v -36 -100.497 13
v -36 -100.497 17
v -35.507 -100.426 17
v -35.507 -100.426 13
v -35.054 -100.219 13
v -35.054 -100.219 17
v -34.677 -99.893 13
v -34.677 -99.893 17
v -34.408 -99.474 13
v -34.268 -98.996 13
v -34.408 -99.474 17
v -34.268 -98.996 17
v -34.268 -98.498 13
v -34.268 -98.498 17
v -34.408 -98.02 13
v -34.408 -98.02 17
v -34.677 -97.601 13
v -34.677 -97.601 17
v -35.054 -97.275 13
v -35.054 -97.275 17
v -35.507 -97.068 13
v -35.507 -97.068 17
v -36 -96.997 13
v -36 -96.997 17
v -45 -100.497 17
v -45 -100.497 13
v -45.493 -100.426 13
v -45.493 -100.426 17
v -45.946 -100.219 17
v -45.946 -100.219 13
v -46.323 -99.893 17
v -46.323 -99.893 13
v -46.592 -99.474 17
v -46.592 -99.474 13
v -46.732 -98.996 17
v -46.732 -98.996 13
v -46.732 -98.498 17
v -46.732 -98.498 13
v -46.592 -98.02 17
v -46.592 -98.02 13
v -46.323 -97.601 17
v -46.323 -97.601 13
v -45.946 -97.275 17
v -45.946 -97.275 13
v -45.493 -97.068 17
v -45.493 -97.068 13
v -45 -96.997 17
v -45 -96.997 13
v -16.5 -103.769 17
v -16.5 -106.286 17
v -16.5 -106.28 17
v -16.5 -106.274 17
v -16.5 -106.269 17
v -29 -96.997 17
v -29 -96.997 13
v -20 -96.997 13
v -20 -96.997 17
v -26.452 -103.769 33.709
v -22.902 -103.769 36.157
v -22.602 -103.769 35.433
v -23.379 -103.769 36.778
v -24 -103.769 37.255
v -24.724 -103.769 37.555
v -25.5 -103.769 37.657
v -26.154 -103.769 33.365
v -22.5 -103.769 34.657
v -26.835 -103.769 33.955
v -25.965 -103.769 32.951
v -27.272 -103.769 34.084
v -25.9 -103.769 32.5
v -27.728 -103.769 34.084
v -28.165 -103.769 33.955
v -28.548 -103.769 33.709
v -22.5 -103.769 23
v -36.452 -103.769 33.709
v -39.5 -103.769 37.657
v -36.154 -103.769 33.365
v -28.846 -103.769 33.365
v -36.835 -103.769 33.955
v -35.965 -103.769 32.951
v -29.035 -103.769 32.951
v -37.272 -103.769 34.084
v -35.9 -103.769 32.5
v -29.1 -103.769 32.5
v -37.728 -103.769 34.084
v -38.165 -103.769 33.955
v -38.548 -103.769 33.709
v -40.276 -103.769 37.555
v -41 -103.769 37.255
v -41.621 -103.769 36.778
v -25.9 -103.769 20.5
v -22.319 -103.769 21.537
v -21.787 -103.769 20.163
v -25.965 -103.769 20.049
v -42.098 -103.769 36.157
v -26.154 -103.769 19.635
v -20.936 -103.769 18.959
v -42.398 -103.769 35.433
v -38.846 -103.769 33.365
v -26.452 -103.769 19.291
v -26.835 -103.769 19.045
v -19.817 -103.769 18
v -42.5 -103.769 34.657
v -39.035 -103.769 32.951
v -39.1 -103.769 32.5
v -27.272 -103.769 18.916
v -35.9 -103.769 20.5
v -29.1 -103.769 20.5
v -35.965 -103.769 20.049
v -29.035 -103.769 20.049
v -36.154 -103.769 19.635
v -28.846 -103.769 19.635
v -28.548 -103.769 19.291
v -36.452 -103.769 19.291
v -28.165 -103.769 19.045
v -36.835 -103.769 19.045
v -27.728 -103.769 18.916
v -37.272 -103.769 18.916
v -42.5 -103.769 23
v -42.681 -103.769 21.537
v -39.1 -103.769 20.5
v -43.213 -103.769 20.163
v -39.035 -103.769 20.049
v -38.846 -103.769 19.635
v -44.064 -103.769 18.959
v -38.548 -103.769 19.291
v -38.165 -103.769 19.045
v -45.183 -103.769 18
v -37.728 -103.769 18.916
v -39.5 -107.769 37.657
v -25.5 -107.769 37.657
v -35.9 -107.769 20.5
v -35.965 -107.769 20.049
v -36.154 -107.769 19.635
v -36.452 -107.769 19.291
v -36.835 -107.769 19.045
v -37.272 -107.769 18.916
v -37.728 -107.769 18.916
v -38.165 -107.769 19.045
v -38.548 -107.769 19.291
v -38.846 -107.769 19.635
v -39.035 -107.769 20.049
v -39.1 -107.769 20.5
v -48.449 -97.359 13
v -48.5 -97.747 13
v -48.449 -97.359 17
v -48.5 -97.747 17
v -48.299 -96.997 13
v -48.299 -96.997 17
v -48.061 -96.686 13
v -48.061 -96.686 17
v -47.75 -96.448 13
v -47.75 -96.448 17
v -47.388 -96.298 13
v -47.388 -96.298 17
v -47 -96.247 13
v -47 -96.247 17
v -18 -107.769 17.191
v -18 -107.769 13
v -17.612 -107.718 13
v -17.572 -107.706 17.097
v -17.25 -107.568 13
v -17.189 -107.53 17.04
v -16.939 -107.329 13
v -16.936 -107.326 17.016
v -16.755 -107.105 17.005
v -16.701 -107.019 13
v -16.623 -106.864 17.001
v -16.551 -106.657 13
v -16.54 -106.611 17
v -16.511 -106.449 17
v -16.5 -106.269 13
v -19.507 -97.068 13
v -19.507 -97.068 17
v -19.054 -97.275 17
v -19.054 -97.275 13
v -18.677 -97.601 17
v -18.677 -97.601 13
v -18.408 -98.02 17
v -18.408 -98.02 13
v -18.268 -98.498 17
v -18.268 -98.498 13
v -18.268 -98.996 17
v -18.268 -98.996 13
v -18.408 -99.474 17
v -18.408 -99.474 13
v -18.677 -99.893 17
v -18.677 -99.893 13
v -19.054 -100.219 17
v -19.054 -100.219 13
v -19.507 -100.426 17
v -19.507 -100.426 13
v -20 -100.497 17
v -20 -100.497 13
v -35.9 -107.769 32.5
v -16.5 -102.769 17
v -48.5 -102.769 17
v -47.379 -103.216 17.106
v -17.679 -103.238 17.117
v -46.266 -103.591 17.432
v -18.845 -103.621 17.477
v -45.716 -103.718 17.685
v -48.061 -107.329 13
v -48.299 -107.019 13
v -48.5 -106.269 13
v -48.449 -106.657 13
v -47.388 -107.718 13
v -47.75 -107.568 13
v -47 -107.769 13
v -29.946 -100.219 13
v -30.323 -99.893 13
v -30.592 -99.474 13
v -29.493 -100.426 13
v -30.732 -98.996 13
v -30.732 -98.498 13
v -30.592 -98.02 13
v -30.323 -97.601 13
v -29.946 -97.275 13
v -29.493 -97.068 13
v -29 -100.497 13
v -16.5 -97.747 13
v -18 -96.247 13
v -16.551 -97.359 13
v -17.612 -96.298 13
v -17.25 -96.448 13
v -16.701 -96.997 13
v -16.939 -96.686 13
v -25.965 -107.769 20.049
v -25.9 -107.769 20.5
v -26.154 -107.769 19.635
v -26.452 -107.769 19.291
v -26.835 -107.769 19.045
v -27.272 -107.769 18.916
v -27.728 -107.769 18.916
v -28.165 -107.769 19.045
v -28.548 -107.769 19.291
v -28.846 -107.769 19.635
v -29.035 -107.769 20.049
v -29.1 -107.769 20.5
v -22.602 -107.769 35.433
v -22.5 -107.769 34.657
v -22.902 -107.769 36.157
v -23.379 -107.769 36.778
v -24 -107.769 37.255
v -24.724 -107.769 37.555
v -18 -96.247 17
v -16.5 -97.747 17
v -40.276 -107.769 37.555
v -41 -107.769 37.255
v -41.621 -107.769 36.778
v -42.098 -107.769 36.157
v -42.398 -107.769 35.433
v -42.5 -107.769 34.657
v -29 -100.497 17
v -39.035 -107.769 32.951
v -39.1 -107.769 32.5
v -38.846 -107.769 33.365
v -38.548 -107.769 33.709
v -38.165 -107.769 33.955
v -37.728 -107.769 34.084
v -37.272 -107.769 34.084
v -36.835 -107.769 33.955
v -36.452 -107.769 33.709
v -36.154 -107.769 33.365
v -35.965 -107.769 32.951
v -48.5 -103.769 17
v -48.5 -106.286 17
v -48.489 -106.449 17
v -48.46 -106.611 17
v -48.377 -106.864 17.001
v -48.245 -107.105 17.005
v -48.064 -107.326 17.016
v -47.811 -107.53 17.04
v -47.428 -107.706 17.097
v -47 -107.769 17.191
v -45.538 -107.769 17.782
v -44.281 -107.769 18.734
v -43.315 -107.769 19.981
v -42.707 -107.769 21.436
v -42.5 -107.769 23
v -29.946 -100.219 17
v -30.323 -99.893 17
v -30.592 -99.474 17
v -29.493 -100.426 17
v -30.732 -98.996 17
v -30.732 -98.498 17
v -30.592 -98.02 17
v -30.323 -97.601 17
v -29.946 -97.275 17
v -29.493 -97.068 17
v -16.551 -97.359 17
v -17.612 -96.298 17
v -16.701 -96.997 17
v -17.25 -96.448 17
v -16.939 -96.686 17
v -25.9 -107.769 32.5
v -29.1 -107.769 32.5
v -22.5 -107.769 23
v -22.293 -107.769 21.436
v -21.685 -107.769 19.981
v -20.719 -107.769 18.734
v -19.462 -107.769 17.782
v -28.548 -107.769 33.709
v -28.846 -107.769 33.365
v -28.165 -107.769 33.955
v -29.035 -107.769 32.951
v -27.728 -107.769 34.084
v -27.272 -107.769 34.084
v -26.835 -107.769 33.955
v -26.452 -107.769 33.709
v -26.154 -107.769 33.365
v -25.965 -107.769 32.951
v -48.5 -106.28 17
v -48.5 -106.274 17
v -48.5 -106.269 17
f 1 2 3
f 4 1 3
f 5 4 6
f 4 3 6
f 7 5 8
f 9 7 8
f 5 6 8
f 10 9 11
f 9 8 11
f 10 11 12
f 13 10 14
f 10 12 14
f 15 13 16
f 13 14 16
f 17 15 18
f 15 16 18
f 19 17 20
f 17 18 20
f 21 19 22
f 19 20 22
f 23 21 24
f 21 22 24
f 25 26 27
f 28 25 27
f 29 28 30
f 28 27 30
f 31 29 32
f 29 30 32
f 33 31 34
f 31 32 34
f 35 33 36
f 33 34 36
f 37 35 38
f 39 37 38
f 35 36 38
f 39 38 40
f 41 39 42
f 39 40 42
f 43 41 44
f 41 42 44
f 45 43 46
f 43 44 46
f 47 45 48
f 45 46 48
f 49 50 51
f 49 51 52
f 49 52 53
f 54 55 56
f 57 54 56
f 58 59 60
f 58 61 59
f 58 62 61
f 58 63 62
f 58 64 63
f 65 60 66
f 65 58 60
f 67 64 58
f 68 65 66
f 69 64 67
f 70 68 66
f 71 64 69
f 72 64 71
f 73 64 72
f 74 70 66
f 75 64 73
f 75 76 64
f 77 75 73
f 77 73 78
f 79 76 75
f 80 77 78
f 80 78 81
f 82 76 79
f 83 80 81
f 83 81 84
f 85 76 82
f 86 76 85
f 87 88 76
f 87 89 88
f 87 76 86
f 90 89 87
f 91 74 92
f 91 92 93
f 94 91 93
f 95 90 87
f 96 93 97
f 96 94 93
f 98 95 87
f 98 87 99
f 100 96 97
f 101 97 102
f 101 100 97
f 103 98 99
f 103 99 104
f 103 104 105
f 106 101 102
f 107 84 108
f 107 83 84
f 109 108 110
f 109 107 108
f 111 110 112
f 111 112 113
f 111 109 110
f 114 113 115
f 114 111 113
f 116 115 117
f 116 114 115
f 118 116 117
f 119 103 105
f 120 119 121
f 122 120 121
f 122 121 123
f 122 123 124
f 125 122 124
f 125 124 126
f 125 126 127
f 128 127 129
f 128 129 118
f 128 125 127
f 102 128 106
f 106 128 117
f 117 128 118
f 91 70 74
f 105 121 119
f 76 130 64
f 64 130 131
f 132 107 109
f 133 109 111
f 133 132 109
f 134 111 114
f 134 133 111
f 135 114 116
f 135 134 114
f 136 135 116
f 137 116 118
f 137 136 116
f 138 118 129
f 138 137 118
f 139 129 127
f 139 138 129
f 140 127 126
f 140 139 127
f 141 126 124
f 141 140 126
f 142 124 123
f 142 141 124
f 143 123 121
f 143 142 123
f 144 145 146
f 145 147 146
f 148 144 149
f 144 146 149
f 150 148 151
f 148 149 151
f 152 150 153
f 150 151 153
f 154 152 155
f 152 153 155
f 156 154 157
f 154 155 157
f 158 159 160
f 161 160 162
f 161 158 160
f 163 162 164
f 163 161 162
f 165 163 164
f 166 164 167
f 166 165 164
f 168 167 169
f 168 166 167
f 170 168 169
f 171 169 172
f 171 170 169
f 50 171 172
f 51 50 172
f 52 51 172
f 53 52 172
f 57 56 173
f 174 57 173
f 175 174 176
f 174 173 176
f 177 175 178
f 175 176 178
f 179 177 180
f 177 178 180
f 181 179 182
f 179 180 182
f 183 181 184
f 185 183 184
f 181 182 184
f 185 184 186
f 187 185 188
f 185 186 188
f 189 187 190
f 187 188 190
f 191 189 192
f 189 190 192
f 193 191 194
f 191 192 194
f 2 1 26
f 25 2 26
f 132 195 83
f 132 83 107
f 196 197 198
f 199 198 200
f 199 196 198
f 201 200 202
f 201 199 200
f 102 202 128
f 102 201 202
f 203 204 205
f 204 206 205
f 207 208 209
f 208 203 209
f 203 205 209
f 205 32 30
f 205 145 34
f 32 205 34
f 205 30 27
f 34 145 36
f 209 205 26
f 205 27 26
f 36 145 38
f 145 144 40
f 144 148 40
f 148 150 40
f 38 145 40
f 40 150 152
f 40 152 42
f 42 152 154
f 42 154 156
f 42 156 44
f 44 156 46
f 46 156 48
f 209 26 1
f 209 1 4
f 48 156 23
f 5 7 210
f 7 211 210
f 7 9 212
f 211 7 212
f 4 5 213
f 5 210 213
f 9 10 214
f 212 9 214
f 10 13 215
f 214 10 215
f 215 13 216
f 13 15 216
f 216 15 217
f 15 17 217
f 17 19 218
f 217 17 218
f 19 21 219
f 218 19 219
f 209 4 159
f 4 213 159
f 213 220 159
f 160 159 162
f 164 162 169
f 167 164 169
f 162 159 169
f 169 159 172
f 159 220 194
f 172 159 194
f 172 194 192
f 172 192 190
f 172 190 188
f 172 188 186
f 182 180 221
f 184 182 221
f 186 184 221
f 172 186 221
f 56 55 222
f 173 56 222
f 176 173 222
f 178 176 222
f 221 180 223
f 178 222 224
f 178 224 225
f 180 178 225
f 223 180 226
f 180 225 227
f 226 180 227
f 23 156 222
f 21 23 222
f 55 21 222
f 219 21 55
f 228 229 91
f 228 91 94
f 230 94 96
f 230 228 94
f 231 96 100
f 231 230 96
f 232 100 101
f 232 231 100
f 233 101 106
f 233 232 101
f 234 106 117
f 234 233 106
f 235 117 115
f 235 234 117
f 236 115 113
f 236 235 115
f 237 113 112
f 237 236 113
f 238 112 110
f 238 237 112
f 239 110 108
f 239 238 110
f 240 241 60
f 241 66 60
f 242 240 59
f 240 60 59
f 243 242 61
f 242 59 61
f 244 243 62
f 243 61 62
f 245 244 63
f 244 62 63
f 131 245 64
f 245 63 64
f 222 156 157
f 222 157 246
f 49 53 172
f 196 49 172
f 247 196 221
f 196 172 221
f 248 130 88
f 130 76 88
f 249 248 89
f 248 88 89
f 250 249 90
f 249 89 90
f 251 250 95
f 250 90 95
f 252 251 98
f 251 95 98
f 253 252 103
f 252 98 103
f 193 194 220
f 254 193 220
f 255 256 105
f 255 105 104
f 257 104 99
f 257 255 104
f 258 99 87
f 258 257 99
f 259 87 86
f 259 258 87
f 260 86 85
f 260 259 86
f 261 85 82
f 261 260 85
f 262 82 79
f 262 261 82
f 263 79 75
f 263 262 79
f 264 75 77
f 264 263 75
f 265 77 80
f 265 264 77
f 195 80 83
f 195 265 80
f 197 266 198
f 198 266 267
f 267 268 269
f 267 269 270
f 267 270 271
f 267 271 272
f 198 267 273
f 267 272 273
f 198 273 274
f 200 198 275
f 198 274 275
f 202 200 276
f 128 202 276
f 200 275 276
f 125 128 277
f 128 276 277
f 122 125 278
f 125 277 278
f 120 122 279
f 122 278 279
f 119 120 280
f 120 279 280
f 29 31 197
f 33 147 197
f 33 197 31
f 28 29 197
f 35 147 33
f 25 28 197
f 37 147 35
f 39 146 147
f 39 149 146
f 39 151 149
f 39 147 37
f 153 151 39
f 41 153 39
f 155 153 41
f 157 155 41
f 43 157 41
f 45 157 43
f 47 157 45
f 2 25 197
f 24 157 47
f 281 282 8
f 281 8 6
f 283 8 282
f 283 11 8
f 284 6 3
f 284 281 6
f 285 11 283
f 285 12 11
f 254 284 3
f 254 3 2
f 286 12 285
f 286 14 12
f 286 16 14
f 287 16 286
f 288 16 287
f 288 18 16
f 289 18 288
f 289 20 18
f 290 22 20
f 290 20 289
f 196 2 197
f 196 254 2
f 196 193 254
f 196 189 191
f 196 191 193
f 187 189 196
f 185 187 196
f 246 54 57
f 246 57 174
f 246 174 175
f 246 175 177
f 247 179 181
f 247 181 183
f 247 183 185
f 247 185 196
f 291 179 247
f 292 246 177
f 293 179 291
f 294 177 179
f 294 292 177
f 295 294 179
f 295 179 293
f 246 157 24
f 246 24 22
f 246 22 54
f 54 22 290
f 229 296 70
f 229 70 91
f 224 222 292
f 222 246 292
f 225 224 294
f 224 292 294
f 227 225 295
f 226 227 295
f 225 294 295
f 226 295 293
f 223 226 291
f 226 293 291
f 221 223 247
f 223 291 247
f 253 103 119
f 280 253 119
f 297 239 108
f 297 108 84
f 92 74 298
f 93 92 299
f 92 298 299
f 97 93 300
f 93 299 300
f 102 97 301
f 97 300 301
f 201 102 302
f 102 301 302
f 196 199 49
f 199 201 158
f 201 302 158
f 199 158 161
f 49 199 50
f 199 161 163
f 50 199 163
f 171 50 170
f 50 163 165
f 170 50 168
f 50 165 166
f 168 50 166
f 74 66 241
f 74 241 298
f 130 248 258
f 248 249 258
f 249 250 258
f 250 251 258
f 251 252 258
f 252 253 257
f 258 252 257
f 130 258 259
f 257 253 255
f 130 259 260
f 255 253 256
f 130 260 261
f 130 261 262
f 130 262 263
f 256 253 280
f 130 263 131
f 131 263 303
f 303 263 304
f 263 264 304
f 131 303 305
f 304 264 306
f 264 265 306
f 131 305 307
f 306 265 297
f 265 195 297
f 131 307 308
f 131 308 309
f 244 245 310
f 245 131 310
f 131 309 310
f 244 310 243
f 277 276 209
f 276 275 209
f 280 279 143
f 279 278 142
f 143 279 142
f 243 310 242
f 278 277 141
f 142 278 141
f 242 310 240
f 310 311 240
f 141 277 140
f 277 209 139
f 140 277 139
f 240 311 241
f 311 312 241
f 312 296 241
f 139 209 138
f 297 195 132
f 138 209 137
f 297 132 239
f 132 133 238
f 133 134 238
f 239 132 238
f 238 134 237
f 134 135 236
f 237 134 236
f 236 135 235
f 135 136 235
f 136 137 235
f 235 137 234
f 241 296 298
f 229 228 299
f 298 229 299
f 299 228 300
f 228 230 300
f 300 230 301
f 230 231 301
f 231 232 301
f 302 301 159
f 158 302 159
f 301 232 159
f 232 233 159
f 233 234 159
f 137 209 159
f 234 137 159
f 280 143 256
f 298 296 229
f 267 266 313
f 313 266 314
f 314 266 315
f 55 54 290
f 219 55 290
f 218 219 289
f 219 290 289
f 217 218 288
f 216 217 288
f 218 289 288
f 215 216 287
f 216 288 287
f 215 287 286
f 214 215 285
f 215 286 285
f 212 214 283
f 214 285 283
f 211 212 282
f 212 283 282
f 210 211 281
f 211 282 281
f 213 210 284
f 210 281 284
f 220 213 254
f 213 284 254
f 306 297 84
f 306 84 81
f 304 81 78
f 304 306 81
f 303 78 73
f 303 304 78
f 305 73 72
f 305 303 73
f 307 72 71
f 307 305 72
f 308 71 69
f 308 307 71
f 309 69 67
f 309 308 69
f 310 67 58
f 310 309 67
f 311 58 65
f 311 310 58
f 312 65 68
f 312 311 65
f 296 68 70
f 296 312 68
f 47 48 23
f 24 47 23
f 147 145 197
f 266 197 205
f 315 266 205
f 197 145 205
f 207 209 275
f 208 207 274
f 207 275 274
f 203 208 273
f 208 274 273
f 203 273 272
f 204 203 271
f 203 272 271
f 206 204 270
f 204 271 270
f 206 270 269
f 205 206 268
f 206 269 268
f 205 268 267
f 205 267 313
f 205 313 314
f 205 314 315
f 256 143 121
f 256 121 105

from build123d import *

# Parameters (mm, degrees)
EXTRUDE_1_DEPTH           = 3
SKETCH_7_R                = 2.25
CUT_EXTRUDE_2_DEPTH       = 143.955430949
SKETCH_8_R                = 8
CUT_EXTRUDE_3_DEPTH       = 143.955430949
CUT_EXTRUDE_4_DEPTH       = 3
CUT_EXTRUDE_5_DEPTH       = 3
CUT_EXTRUDE_8_DEPTH       = 3
SKETCH_12_R               = 1.7
CUT_EXTRUDE_9_DEPTH       = 3
SKETCH_13_R               = 1.7
CUT_EXTRUDE_11_DEPTH      = 3
CUT_EXTRUDE_12_DEPTH      = 143.955430949
FILLET_1_R                = 2
FILLET_2_R                = 2
CUT_EXTRUDE_13_DEPTH      = 143.955430949
CUT_EXTRUDE_14_DEPTH      = 143.955430949
CUT_EXTRUDE_15_DEPTH      = 143.955430949
CUT_EXTRUDE_16_DEPTH      = 143.955430949
EXTRUDE_2_DEPTH           = 4
EXTRUDE_2_2_DEPTH         = 4
EXTRUDE_4_DEPTH           = 4
EXTRUDE_5_DEPTH           = 35
SKETCH_25_W               = 6
SKETCH_25_H               = 31
CUT_EXTRUDE_17_DEPTH      = 5
FILLET_3_R                = 6
FILLET_4_R                = 6
FILLET_5_R                = 1.5
FILLET_6_R                = 1.5
CUT_EXTRUDE_18_DEPTH      = 5
CUT_EXTRUDE_19_DEPTH      = 15
CUT_EXTRUDE_19_DEPTH_BACK = 95
SKETCH_27_W               = 31
SKETCH_27_H               = 1
FILLET_8_R                = 1
FILLET_9_R                = 1
FILLET_10_R               = 3
SKETCH_28_W               = 85
SKETCH_28_H               = 10.343066278
CUT_EXTRUDE_20_DEPTH      = 5
FILLET_12_R               = 3
FILLET_13_R               = 3
SKETCH_32_W               = 45.323158308
SKETCH_32_H               = 39.541616474
CUT_EXTRUDE_22_DEPTH      = 40


# Read off the part's stored shape, not the designer's step: 切除-拉伸21
# Some blends are built 0.0001 mm under size
with BuildPart() as part:
    # 草图1 → 凸台-拉伸1 (new body)
    # profile 1 of 14: a face of its own
    with BuildSketch(Plane.XY):
        with BuildLine():
            Line((60, 106.603296002), (35.889163634, 121.664519159))
            Line((35.889163634, 121.664519159), (-35.889163634, 121.664519159))
            Line((-35.889163634, 121.664519159), (-60, 106.603296002))
            Line((-60, 106.603296002), (-60, 94.801892265))
            Line((-60, 94.801892265), (-45, 94.801892265))
            ThreePointArc((-45, 94.801892265), (-43.762563133, 94.289329132), (-43.25, 93.051892265))
            Line((-43.25, 93.051892265), (-37.75, 93.051892265))
            ThreePointArc((-37.75, 93.051892265), (-37.237436867, 94.289329132), (-36, 94.801892265))
            Line((-36, 94.801892265), (-21, 94.801892265))
            ThreePointArc((-21, 94.801892265), (-19.762563133, 94.289329132), (-19.25, 93.051892265))
            Line((-19.25, 93.051892265), (19.25, 93.051892265))
            ThreePointArc((19.25, 93.051892265), (19.762563133, 94.289329132), (21, 94.801892265))
            Line((21, 94.801892265), (36, 94.801892265))
            ThreePointArc((36, 94.801892265), (37.237436867, 94.289329132), (37.75, 93.051892265))
            Line((37.75, 93.051892265), (43.25, 93.051892265))
            ThreePointArc((43.25, 93.051892265), (43.762563133, 94.289329132), (45, 94.801892265))
            Line((45, 94.801892265), (60, 94.801892265))
            Line((60, 94.801892265), (60, 106.603296002))
        make_face()
    # profile 2 of 14: a face of its own
    with BuildSketch(Plane.XY):
        with BuildLine():
            Line((66.901694095, 102.292041372), (60, 106.603296002))
            Line((60, 106.603296002), (60, 94.801892265))
            ThreePointArc((60, 94.801892265), (61.237436867, 94.289329132), (61.75, 93.051892265))
            Line((61.75, 93.051892265), (66.901694095, 93.051892265))
            Line((66.901694095, 93.051892265), (66.901694095, 102.292041372))
        make_face()
    # profile 3 of 14: a face of its own
    with BuildSketch(Plane.XY):
        with BuildLine():
            Line((-60, 94.801892265), (-60, 106.603296002))
            Line((-60, 106.603296002), (-66.901694095, 102.292041372))
            Line((-66.901694095, 102.292041372), (-66.901694095, 93.051892265))
            Line((-66.901694095, 93.051892265), (-61.75, 93.051892265))
            ThreePointArc((-61.75, 93.051892265), (-61.237436867, 94.289329132), (-60, 94.801892265))
        make_face()
    # profile 4 of 14: a face of its own
    with BuildSketch(Plane.XY):
        with BuildLine():
            Line((66.901694095, 63.051892265), (66.901694095, 93.051892265))
            Line((66.901694095, 93.051892265), (61.75, 93.051892265))
            ThreePointArc((61.75, 93.051892265), (61.237436867, 91.814455398), (60, 91.301892265))
            Line((60, 91.301892265), (60, 64.801892265))
            ThreePointArc((60, 64.801892265), (61.237436867, 64.289329132), (61.75, 63.051892265))
            Line((61.75, 63.051892265), (66.901694095, 63.051892265))
        make_face()
    # profile 5 of 14: a face of its own
    with BuildSketch(Plane.XY):
        with BuildLine():
            Line((-61.75, 93.051892265), (-66.901694095, 93.051892265))
            Line((-66.901694095, 93.051892265), (-66.901694095, 63.051892265))
            Line((-66.901694095, 63.051892265), (-61.75, 63.051892265))
            ThreePointArc((-61.75, 63.051892265), (-61.237436867, 64.289329132), (-60, 64.801892265))
            Line((-60, 64.801892265), (-60, 91.301892265))
            ThreePointArc((-60, 91.301892265), (-61.237436867, 91.814455398), (-61.75, 93.051892265))
        make_face()
    # profile 6 of 14: a face of its own
    with BuildSketch(Plane.XY):
        with BuildLine():
            Line((66.901694095, 52.870133869), (66.901694095, 63.051892265))
            Line((66.901694095, 63.051892265), (61.75, 63.051892265))
            ThreePointArc((61.75, 63.051892265), (61.237436867, 61.814455398), (60, 61.301892265))
            Line((60, 61.301892265), (60, 31.261343001))
            Line((60, 31.261343001), (75, 31.261343001))
            Line((75, 31.261343001), (75, 40.933889795))
            ThreePointArc((75, 40.933889795), (69.117351927, 45.658052319), (66.901694095, 52.870133869))
        make_face()
    # profile 7 of 14: a face of its own
    with BuildSketch(Plane.XY):
        with BuildLine():
            Line((60, 64.801892265), (60, 91.301892265))
            Line((60, 91.301892265), (45, 91.301892265))
            ThreePointArc((45, 91.301892265), (43.762563133, 91.814455398), (43.25, 93.051892265))
            Line((43.25, 93.051892265), (37.75, 93.051892265))
            ThreePointArc((37.75, 93.051892265), (37.237436867, 91.814455398), (36, 91.301892265))
            Line((36, 91.301892265), (21, 91.301892265))
            ThreePointArc((21, 91.301892265), (19.762563133, 91.814455398), (19.25, 93.051892265))
            Line((19.25, 93.051892265), (-19.25, 93.051892265))
            ThreePointArc((-19.25, 93.051892265), (-19.762563133, 91.814455398), (-21, 91.301892265))
            Line((-21, 91.301892265), (-36, 91.301892265))
            ThreePointArc((-36, 91.301892265), (-37.237436867, 91.814455398), (-37.75, 93.051892265))
            Line((-37.75, 93.051892265), (-43.25, 93.051892265))
            ThreePointArc((-43.25, 93.051892265), (-43.762563133, 91.814455398), (-45, 91.301892265))
            Line((-45, 91.301892265), (-60, 91.301892265))
            Line((-60, 91.301892265), (-60, 64.801892265))
            Line((-60, 64.801892265), (-45, 64.801892265))
            ThreePointArc((-45, 64.801892265), (-43.762563133, 64.289329132), (-43.25, 63.051892265))
            Line((-43.25, 63.051892265), (-37.75, 63.051892265))
            ThreePointArc((-37.75, 63.051892265), (-37.237436867, 64.289329132), (-36, 64.801892265))
            Line((-36, 64.801892265), (-21, 64.801892265))
            ThreePointArc((-21, 64.801892265), (-19.762563133, 64.289329132), (-19.25, 63.051892265))
            Line((-19.25, 63.051892265), (19.25, 63.051892265))
            ThreePointArc((19.25, 63.051892265), (19.762563133, 64.289329132), (21, 64.801892265))
            Line((21, 64.801892265), (36, 64.801892265))
            ThreePointArc((36, 64.801892265), (37.237436867, 64.289329132), (37.75, 63.051892265))
            Line((37.75, 63.051892265), (43.25, 63.051892265))
            ThreePointArc((43.25, 63.051892265), (43.762563133, 64.289329132), (45, 64.801892265))
            Line((45, 64.801892265), (60, 64.801892265))
        make_face()
    # profile 8 of 14: a face of its own
    with BuildSketch(Plane.XY):
        with BuildLine():
            Line((-61.75, 63.051892265), (-66.901694095, 63.051892265))
            Line((-66.901694095, 63.051892265), (-66.901694095, 52.870133869))
            ThreePointArc((-66.901694095, 52.870133869), (-69.117351927, 45.658052319), (-75, 40.933889795))
            Line((-75, 40.933889795), (-75, 31.261343001))
            Line((-75, 31.261343001), (-60, 31.261343001))
            Line((-60, 31.261343001), (-60, 61.301892265))
            ThreePointArc((-60, 61.301892265), (-61.237436867, 61.814455398), (-61.75, 63.051892265))
        make_face()
    # profile 9 of 14: a face of its own
    with BuildSketch(Plane.XY):
        with BuildLine():
            Line((60, 31.261343001), (60, 61.301892265))
            Line((60, 61.301892265), (45, 61.301892265))
            ThreePointArc((45, 61.301892265), (43.762563133, 61.814455398), (43.25, 63.051892265))
            Line((43.25, 63.051892265), (37.75, 63.051892265))
            ThreePointArc((37.75, 63.051892265), (37.237436867, 61.814455398), (36, 61.301892265))
            Line((36, 61.301892265), (21, 61.301892265))
            ThreePointArc((21, 61.301892265), (19.762563133, 61.814455398), (19.25, 63.051892265))
            Line((19.25, 63.051892265), (-19.25, 63.051892265))
            ThreePointArc((-19.25, 63.051892265), (-19.762563133, 61.814455398), (-21, 61.301892265))
            Line((-21, 61.301892265), (-36, 61.301892265))
            ThreePointArc((-36, 61.301892265), (-37.237436867, 61.814455398), (-37.75, 63.051892265))
            Line((-37.75, 63.051892265), (-43.25, 63.051892265))
            ThreePointArc((-43.25, 63.051892265), (-43.762563133, 61.814455398), (-45, 61.301892265))
            Line((-45, 61.301892265), (-60, 61.301892265))
            Line((-60, 61.301892265), (-60, 31.261343001))
            Line((-60, 31.261343001), (60, 31.261343001))
        make_face()
    # profile 10 of 14: a face of its own
    with BuildSketch(Plane.XY):
        with BuildLine():
            Line((60, -58.312864289), (60, 23.940028391))
            Line((60, 23.940028391), (-60, 23.940028391))
            Line((-60, 23.940028391), (-60, -58.312864289))
            Line((-60, -58.312864289), (-45, -58.312864289))
            ThreePointArc((-45, -58.312864289), (-43.25, -60.062864289), (-45, -61.812864289))
            Line((-45, -61.812864289), (-60, -61.812864289))
            Line((-60, -61.812864289), (-60, -88.312864289))
            Line((-60, -88.312864289), (-45, -88.312864289))
            ThreePointArc((-45, -88.312864289), (-43.25, -90.062864289), (-45, -91.812864289))
            Line((-45, -91.812864289), (-60, -91.812864289))
            Line((-60, -91.812864289), (-60, -111.849967256))
            Line((-60, -111.849967256), (-38.845469114, -105.590576733))
            ThreePointArc((-38.845469114, -105.590576733), (-36.037784492, -104.975210108), (-33.17088573, -104.768665882))
            Line((-33.17088573, -104.768665882), (33.17088573, -104.768665882))
            ThreePointArc((33.17088573, -104.768665882), (36.037784492, -104.975210108), (38.845469114, -105.590576733))
            Line((38.845469114, -105.590576733), (60, -111.849967256))
            Line((60, -111.849967256), (60, -91.812864289))
            Line((60, -91.812864289), (45, -91.812864289))
            ThreePointArc((45, -91.812864289), (43.762563133, -91.300301156), (43.25, -90.062864289))
            ThreePointArc((43.25, -90.062864289), (43.762563133, -88.825427422), (45, -88.312864289))
            Line((45, -88.312864289), (60, -88.312864289))
            Line((60, -88.312864289), (60, -61.812864289))
            Line((60, -61.812864289), (45, -61.812864289))
            ThreePointArc((45, -61.812864289), (43.762563133, -61.300301156), (43.25, -60.062864289))
            ThreePointArc((43.25, -60.062864289), (43.762563133, -58.825427422), (45, -58.312864289))
            Line((45, -58.312864289), (60, -58.312864289))
        make_face()
        with BuildLine():
            ThreePointArc((-21, -88.312864289), (-19.762563133, -88.825427422), (-19.25, -90.062864289))
            ThreePointArc((-19.25, -90.062864289), (-19.762563133, -91.300301156), (-21, -91.812864289))
            Line((-21, -91.812864289), (-36, -91.812864289))
            ThreePointArc((-36, -91.812864289), (-37.75, -90.062864289), (-36, -88.312864289))
            Line((-36, -88.312864289), (-21, -88.312864289))
        make_face(mode=Mode.SUBTRACT)
        with BuildLine():
            ThreePointArc((-21, -58.312864289), (-19.762563133, -58.825427422), (-19.25, -60.062864289))
            ThreePointArc((-19.25, -60.062864289), (-19.762563133, -61.300301156), (-21, -61.812864289))
            Line((-21, -61.812864289), (-36, -61.812864289))
            ThreePointArc((-36, -61.812864289), (-37.75, -60.062864289), (-36, -58.312864289))
            Line((-36, -58.312864289), (-21, -58.312864289))
        make_face(mode=Mode.SUBTRACT)
        with BuildLine():
            ThreePointArc((36, -88.312864289), (37.237436867, -88.825427422), (37.75, -90.062864289))
            ThreePointArc((37.75, -90.062864289), (37.237436867, -91.300301156), (36, -91.812864289))
            Line((36, -91.812864289), (21, -91.812864289))
            ThreePointArc((21, -91.812864289), (19.762563133, -91.300301156), (19.25, -90.062864289))
            ThreePointArc((19.25, -90.062864289), (19.762563133, -88.825427422), (21, -88.312864289))
            Line((21, -88.312864289), (36, -88.312864289))
        make_face(mode=Mode.SUBTRACT)
        with BuildLine():
            ThreePointArc((36, -58.312864289), (37.237436867, -58.825427422), (37.75, -60.062864289))
            ThreePointArc((37.75, -60.062864289), (37.237436867, -61.300301156), (36, -61.812864289))
            Line((36, -61.812864289), (21, -61.812864289))
            ThreePointArc((21, -61.812864289), (19.762563133, -61.300301156), (19.25, -60.062864289))
            ThreePointArc((19.25, -60.062864289), (19.762563133, -58.825427422), (21, -58.312864289))
            Line((21, -58.312864289), (36, -58.312864289))
        make_face(mode=Mode.SUBTRACT)
    # profile 11 of 14: a face of its own
    with BuildSketch(Plane.XY):
        with BuildLine():
            Line((75, 23.940028391), (60, 23.940028391))
            Line((60, 23.940028391), (60, -58.312864289))
            ThreePointArc((60, -58.312864289), (61.237436867, -58.825427422), (61.75, -60.062864289))
            Line((61.75, -60.062864289), (67.402721334, -60.062864289))
            add(Edge.make_bspline(
                [(75, 10.562559835), (72.695878257, 1.907314233), (70.339582535, -13.372796253), (67.818206704, -36.939032951), (67.208860388, -51.77269444), (67.402721334, -60.062864289)],
                knots=[0, 0, 0, 0, 0.235246678, 0.40629419, 0.624108181, 0.624108181, 0.624108181, 0.624108181], degree=3))
            Line((75, 10.562559835), (75, 23.940028391))
        make_face()
    # profile 12 of 14: a face of its own
    with BuildSketch(Plane.XY):
        with BuildLine():
            Line((-60, -58.312864289), (-60, 23.940028391))
            Line((-60, 23.940028391), (-75, 23.940028391))
            Line((-75, 23.940028391), (-75, 10.562559835))
            add(Edge.make_bspline(
                [(-75, 10.562559835), (-72.695878257, 1.907314233), (-70.339582535, -13.372796253), (-67.818206704, -36.939032951), (-67.208860388, -51.77269444), (-67.402721334, -60.062864289)],
                knots=[0, 0, 0, 0, 0.235246678, 0.40629419, 0.624108181, 0.624108181, 0.624108181, 0.624108181], degree=3))
            add(Edge.make_bspline(
                [(-67.402721334, -60.062864289), (-67.560325872, -66.802583754), (-68.323504015, -76.843670093), (-70.154131955, -86.778530076), (-70.533712858, -90.062864289)],
                knots=[0.624108181, 0.624108181, 0.624108181, 0.624108181, 0.801186001, 0.888408652, 0.888408652, 0.888408652, 0.888408652], degree=3))
            add(Edge.make_bspline(
                [(-70.533712858, -90.062864289), (-71.019342956, -94.264792095), (-71.137422935, -98.476048206), (-70.1742624, -102.732794059)],
                knots=[0.888408652, 0.888408652, 0.888408652, 0.888408652, 1, 1, 1, 1], degree=3))
            Line((-70.1742624, -102.732794059), (-66.460817635, -113.761651372))
            Line((-66.460817635, -113.761651372), (-60, -111.849967256))
            Line((-60, -111.849967256), (-60, -91.812864289))
            ThreePointArc((-60, -91.812864289), (-61.75, -90.062864289), (-60, -88.312864289))
            Line((-60, -88.312864289), (-60, -61.812864289))
            ThreePointArc((-60, -61.812864289), (-61.75, -60.062864289), (-60, -58.312864289))
        make_face()
    # profile 13 of 14: a face of its own
    with BuildSketch(Plane.XY):
        with BuildLine():
            Line((67.402721334, -60.062864289), (61.75, -60.062864289))
            ThreePointArc((61.75, -60.062864289), (61.237436867, -61.300301156), (60, -61.812864289))
            Line((60, -61.812864289), (60, -88.312864289))
            ThreePointArc((60, -88.312864289), (61.237436867, -88.825427422), (61.75, -90.062864289))
            Line((61.75, -90.062864289), (70.533712858, -90.062864289))
            add(Edge.make_bspline(
                [(67.402721334, -60.062864289), (67.560325872, -66.802583754), (68.323504015, -76.843670093), (70.154131955, -86.778530076), (70.533712858, -90.062864289)],
                knots=[0.624108181, 0.624108181, 0.624108181, 0.624108181, 0.801186001, 0.888408652, 0.888408652, 0.888408652, 0.888408652], degree=3))
        make_face()
    # profile 14 of 14: a face of its own
    with BuildSketch(Plane.XY):
        with BuildLine():
            add(Edge.make_bspline(
                [(70.533712858, -90.062864289), (71.019342956, -94.264792095), (71.137422935, -98.476048206), (70.1742624, -102.732794059)],
                knots=[0.888408652, 0.888408652, 0.888408652, 0.888408652, 1, 1, 1, 1], degree=3))
            Line((70.533712858, -90.062864289), (61.75, -90.062864289))
            ThreePointArc((61.75, -90.062864289), (61.237436867, -91.300301156), (60, -91.812864289))
            Line((60, -91.812864289), (60, -111.849967256))
            Line((60, -111.849967256), (66.460817635, -113.761651372))
            Line((66.460817635, -113.761651372), (70.1742624, -102.732794059))
        make_face()
    extrude(amount=EXTRUDE_1_DEPTH)

    # 草图7 → 切除-拉伸2 (cut, through all)
    with BuildSketch(Plane(origin=(0, 0, 0), x_dir=(-1, 0, 0), z_dir=(0, 0, -1))):
        with Locations((-21, 41.261343001)):
            Circle(SKETCH_7_R)
        with Locations((21, 41.261343001)):
            Circle(SKETCH_7_R)
        with Locations((-21, 13.940028391)):
            Circle(SKETCH_7_R)
        with Locations((21, 13.940028391)):
            Circle(SKETCH_7_R)
    extrude(amount=-CUT_EXTRUDE_2_DEPTH, mode=Mode.SUBTRACT)

    # 草图8 → 切除-拉伸3 (cut, through all)
    with BuildSketch(Plane.XY.offset(3)):
        with BuildLine():
            Line((-12.621438714, -0.378557945), (-33.409010345, 20.409013685))
            ThreePointArc((-33.409010345, 20.409013685), (-36.590999434, 20.409013643), (-36.590999309, 17.227024553))
            Line((-36.590999309, 17.227024553), (-15.803426586, -3.560545984))
            ThreePointArc((-15.803426586, -3.560545984), (-12.621438673, -3.560545859), (-12.621438714, -0.378557945))
        make_face()
        with BuildLine():
            Line((33.410462056, 20.410458798), (12.572988319, -0.427010824))
            ThreePointArc((12.572988319, -0.427010824), (12.644570441, -3.584764993), (15.803045702, -3.56090242))
            Line((15.803045702, -3.56090242), (34.999999982, 15.636052774))
            Line((34.999999982, 15.636052774), (36.588086952, 17.224139819))
            ThreePointArc((36.588086952, 17.224139819), (36.592433993, 20.406111757), (33.410462056, 20.410458798))
        make_face()
        with BuildLine():
            Line((-15.803784812, -28.80377835), (-36.591002186, -49.590991619))
            ThreePointArc((-36.591002186, -49.590991619), (-36.591002403, -52.772972232), (-33.40902179, -52.772972254))
            Line((-33.40902179, -52.772972254), (-12.573723916, -31.937673388))
            ThreePointArc((-12.573723916, -31.937673388), (-12.64530628, -28.779915954), (-15.803784812, -28.80377835))
        make_face()
        with BuildLine():
            Line((36.590992666, -49.590989326), (15.803414627, -28.803411286))
            ThreePointArc((15.803414627, -28.803411286), (12.654338964, -28.769774302), (12.55344336, -31.917412949))
            Line((12.55344336, -31.917412949), (33.409007381, -52.772974779))
            ThreePointArc((33.409007381, -52.772974779), (36.590992708, -52.772974653), (36.590992666, -49.590989326))
        make_face()
        with Locations((-0.000368782, -16.182341354)):
            Circle(SKETCH_8_R)
    extrude(amount=-CUT_EXTRUDE_3_DEPTH, mode=Mode.SUBTRACT)

    # 草图9 → 切除-拉伸4 (cut)
    with BuildSketch(Plane.XY.offset(3)):
        with BuildLine():
            Line((55, -100.49704609), (20, -100.49704609))
            ThreePointArc((20, -100.49704609), (18.25, -98.74704609), (20, -96.99704609))
            Line((20, -96.99704609), (55, -96.99704609))
            ThreePointArc((55, -96.99704609), (56.75, -98.74704609), (55, -100.49704609))
        make_face()
        with BuildLine():
            Line((-55, -96.99704609), (-20, -96.99704609))
            ThreePointArc((-20, -96.99704609), (-18.25, -98.74704609), (-20, -100.49704609))
            Line((-20, -100.49704609), (-55, -100.49704609))
            ThreePointArc((-55, -100.49704609), (-56.75, -98.74704609), (-55, -96.99704609))
        make_face()
    extrude(amount=-CUT_EXTRUDE_4_DEPTH, mode=Mode.SUBTRACT)

    # 草图10 → 切除-拉伸5 (cut)
    with BuildSketch(Plane.XY.offset(3)):
        with BuildLine():
            Line((12.5, -80.062864289), (-12.5, -80.062864289))
            ThreePointArc((-12.5, -80.062864289), (-17.5, -75.062864289), (-12.5, -70.062864289))
            Line((-12.5, -70.062864289), (12.5, -70.062864289))
            ThreePointArc((12.5, -70.062864289), (17.5, -75.062864289), (12.5, -80.062864289))
        make_face()
    extrude(amount=-CUT_EXTRUDE_5_DEPTH, mode=Mode.SUBTRACT)

    # 草图11 → 切除-拉伸8 (cut)
    with BuildSketch(Plane.XY.offset(3)):
        with BuildLine():
            Line((15, 73.051892265), (-15, 73.051892265))
            ThreePointArc((-15, 73.051892265), (-20, 78.051892265), (-15, 83.051892265))
            Line((-15, 83.051892265), (15, 83.051892265))
            ThreePointArc((15, 83.051892265), (20, 78.051892265), (15, 73.051892265))
        make_face()
    extrude(amount=-CUT_EXTRUDE_8_DEPTH, mode=Mode.SUBTRACT)

    # 草图12 → 切除-拉伸9 (cut)
    with BuildSketch(Plane.XY.offset(3)):
        with Locations((0, 114.371786435)):
            Circle(SKETCH_12_R)
        with Locations((0, 98.371786435)):
            Circle(SKETCH_12_R)
        with Locations((8, 106.371786435)):
            Circle(SKETCH_12_R)
        with Locations((-8, 106.371786435)):
            Circle(SKETCH_12_R)
    extrude(amount=-CUT_EXTRUDE_9_DEPTH, mode=Mode.SUBTRACT)

    # 草图13 → 切除-拉伸11 (cut)
    with BuildSketch(Plane.XY.offset(3)):
        with Locations((0, -84.415765086)):
            Circle(SKETCH_13_R)
        with Locations((8, -92.415765086)):
            Circle(SKETCH_13_R)
        with Locations((0, -100.415765086)):
            Circle(SKETCH_13_R)
        with Locations((-8, -92.415765086)):
            Circle(SKETCH_13_R)
    extrude(amount=-CUT_EXTRUDE_11_DEPTH, mode=Mode.SUBTRACT)

    # 草图14 → 切除-拉伸12 (cut, through all)
    with BuildSketch(Plane.XY.offset(3)):
        with BuildLine():
            Line((-55.475501567, 8.919687236), (-55.475501567, -46.080312764))
            ThreePointArc((-55.475501567, -46.080312764), (-57.225501567, -47.830312764), (-58.975501567, -46.080312764))
            Line((-58.975501567, -46.080312764), (-58.975501567, 8.919687236))
            ThreePointArc((-58.975501567, 8.919687236), (-57.225501567, 10.669687236), (-55.475501567, 8.919687236))
        make_face()
        with BuildLine():
            Line((58.975501567, 8.919687236), (58.975501567, -46.080312764))
            ThreePointArc((58.975501567, -46.080312764), (57.225501567, -47.830312764), (55.475501567, -46.080312764))
            Line((55.475501567, -46.080312764), (55.475501567, 8.919687236))
            ThreePointArc((55.475501567, 8.919687236), (57.225501567, 10.669687236), (58.975501567, 8.919687236))
        make_face()
    extrude(amount=-CUT_EXTRUDE_12_DEPTH, mode=Mode.SUBTRACT)

    # 圆角1
    fillet_1_edges = [part.edges().sort_by_distance(p)[0] for p in [
        (75, 31.261343001, 1.5),
        (-75, 31.261343001, 1.5),
    ]]
    fillet(fillet_1_edges, radius=FILLET_1_R)

    # 圆角2
    fillet_2_edges = [part.edges().sort_by_distance(p)[0] for p in [
        (-75, 23.940028391, 1.5),
        (75, 23.940028391, 1.5),
    ]]
    fillet(fillet_2_edges, radius=FILLET_2_R)

    # 草图15 → 切除-拉伸13 (cut, through all)
    with BuildSketch(Plane(origin=(0, 0, 0), x_dir=(-1, 0, 0), z_dir=(0, 0, -1))):
        with BuildLine():
            Line((-61.184216401, 102.403501276), (-34.774762862, 118.900592756))
            ThreePointArc((-34.774762862, 118.900592756), (-32.70788159, 118.423097411), (-33.185376934, 116.356216138))
            Line((-33.185376934, 116.356216138), (-59.594830473, 99.859124658))
            ThreePointArc((-59.594830473, 99.859124658), (-61.661711746, 100.336620003), (-61.184216401, 102.403501276))
        make_face()
        with BuildLine():
            Line((59.594830473, 99.859124658), (33.185376934, 116.356216138))
            ThreePointArc((33.185376934, 116.356216138), (32.70788159, 118.423097411), (34.774762862, 118.900592756))
            Line((34.774762862, 118.900592756), (61.184216401, 102.403501276))
            ThreePointArc((61.184216401, 102.403501276), (61.661711746, 100.336620003), (59.594830473, 99.859124658))
        make_face()
    extrude(amount=-CUT_EXTRUDE_13_DEPTH, mode=Mode.SUBTRACT)

    # 草图16 → 切除-拉伸14 (cut, through all)
    with BuildSketch(Plane(origin=(0, 0, 0), x_dir=(-1, 0, 0), z_dir=(0, 0, -1))):
        with BuildLine():
            Line((-61.516979467, 42.761343001), (-32.056291893, 42.761343001))
            ThreePointArc((-32.056291893, 42.761343001), (-30.556291893, 41.261343001), (-32.056291893, 39.761343001))
            Line((-32.056291893, 39.761343001), (-61.516979467, 39.761343001))
            ThreePointArc((-61.516979467, 39.761343001), (-63.016979467, 41.261343001), (-61.516979467, 42.761343001))
        make_face()
        with BuildLine():
            Line((61.516979467, 39.761343001), (32.056291893, 39.761343001))
            ThreePointArc((32.056291893, 39.761343001), (30.556291893, 41.261343001), (32.056291893, 42.761343001))
            Line((32.056291893, 42.761343001), (61.516979467, 42.761343001))
            ThreePointArc((61.516979467, 42.761343001), (63.016979467, 41.261343001), (61.516979467, 39.761343001))
        make_face()
    extrude(amount=-CUT_EXTRUDE_14_DEPTH, mode=Mode.SUBTRACT)

    # 草图17 → 切除-拉伸15 (cut, through all)
    with BuildSketch(Plane(origin=(0, 0, 0), x_dir=(-1, 0, 0), z_dir=(0, 0, -1))):
        Polygon((-28.645414283, -8.118433382), (-34.644957411, -20.11751964), (-34.644957411, -29.946558382), (-37.580904049, -29.946558382), (-37.580904049, -20.11751964), (-43.580447177, -8.118433382), (-40.64450054, -8.118433382), (-36.176755657, -17.43687271), (-36.049105803, -17.43687271), (-31.58136092, -8.118433382), align=None)
    extrude(amount=-CUT_EXTRUDE_15_DEPTH, mode=Mode.SUBTRACT)

    # 草图18 → 切除-拉伸16 (cut, through all)
    with BuildSketch(Plane(origin=(0, 0, 0), x_dir=(-1, 0, 0), z_dir=(0, 0, -1))):
        Polygon((46.06697123, -29.087529791), (43.131024593, -29.087529791), (43.131024593, -18.875541487), (35.854982926, -18.875541487), (35.854982926, -29.087529791), (32.919036289, -29.087529791), (32.919036289, -7.259404791), (35.854982926, -7.259404791), (35.854982926, -16.450194265), (43.131024593, -16.450194265), (43.131024593, -7.259404791), (46.06697123, -7.259404791), align=None)
    extrude(amount=-CUT_EXTRUDE_16_DEPTH, mode=Mode.SUBTRACT)


with BuildPart() as body_2:
    # 草图19 → 凸台-拉伸2 (new body)
    with BuildSketch(Plane.XY.offset(13)):
        Polygon((16.5, -101.24704609), (16.5, -96.24704609), (48.5, -96.24704609), (48.5, -101.24704609), (48.5, -104.768665882), (16.5, -104.768665882), align=None)
        with BuildLine():
            Line((20, -100.49704609), (45, -100.49704609))
            ThreePointArc((45, -100.49704609), (46.75, -98.74704609), (45, -96.99704609))
            Line((45, -96.99704609), (20, -96.99704609))
            ThreePointArc((20, -96.99704609), (18.25, -98.74704609), (20, -100.49704609))
        make_face(mode=Mode.SUBTRACT)
    extrude(amount=EXTRUDE_2_DEPTH)



with BuildPart() as body_3:
    # 草图19 → Extrude 2 2 (new body)
    with BuildSketch(Plane.XY.offset(13)):
        Polygon((-16.5, -101.24704609), (-16.5, -104.768665882), (-48.5, -104.768665882), (-48.5, -101.24704609), (-48.5, -96.24704609), (-16.5, -96.24704609), align=None)
        with BuildLine():
            Line((-45, -96.99704609), (-20, -96.99704609))
            ThreePointArc((-20, -96.99704609), (-18.25, -98.74704609), (-20, -100.49704609))
            Line((-20, -100.49704609), (-45, -100.49704609))
            ThreePointArc((-45, -100.49704609), (-46.75, -98.74704609), (-45, -96.99704609))
        make_face(mode=Mode.SUBTRACT)
    extrude(amount=EXTRUDE_2_2_DEPTH)


with BuildPart() as body_2_1:
    add(body_2.part)

    add(body_3.part)  # 凸台-拉伸4 merges body 3
    # 草图21 → 凸台-拉伸4 (add)
    with BuildSketch(Plane.XY.offset(17)):
        with BuildLine():
            Line((-36, -96.99704609), (-29, -96.99704609))
            ThreePointArc((-29, -96.99704609), (-30.75, -98.74704609), (-29, -100.49704609))
            Line((-29, -100.49704609), (-36, -100.49704609))
            ThreePointArc((-36, -100.49704609), (-34.25, -98.74704609), (-36, -96.99704609))
        make_face()
        with BuildLine():
            Line((36, -100.49704609), (29, -100.49704609))
            ThreePointArc((29, -100.49704609), (30.75, -98.74704609), (29, -96.99704609))
            Line((29, -96.99704609), (36, -96.99704609))
            ThreePointArc((36, -96.99704609), (34.25, -98.74704609), (36, -100.49704609))
        make_face()
    extrude(amount=-EXTRUDE_4_DEPTH)

    # 草图23 → 凸台-拉伸5 (add)
    with BuildSketch(Plane.XY.offset(13)):
        Polygon((-48.5, -104.768665882), (-48.5, -107.768665882), (-16.5, -107.768665882), (-16.5, -104.768665882), (-16.5, -102.768665882), (-48.5, -102.768665882), align=None)
        Polygon((16.5, -104.768665882), (16.5, -107.768665882), (48.5, -107.768665882), (48.5, -104.768665882), (48.5, -102.768665882), (16.5, -102.768665882), align=None)
    extrude(amount=EXTRUDE_5_DEPTH)

    # 草图25 → 切除-拉伸17 (cut)
    with BuildSketch(Plane(origin=(0, -102.768665882, 0), x_dir=(1, 0, 0), z_dir=(0, 1, 0))):
        with Locations((-19.5, -32.5)):
            Rectangle(SKETCH_25_W, SKETCH_25_H)
        with Locations((-45.5, -32.5)):
            Rectangle(SKETCH_25_W, SKETCH_25_H)
        with Locations((19.5, -32.5)):
            Rectangle(SKETCH_25_W, SKETCH_25_H)
        with Locations((45.5, -32.5)):
            Rectangle(SKETCH_25_W, SKETCH_25_H)
    extrude(amount=-CUT_EXTRUDE_17_DEPTH, mode=Mode.SUBTRACT)

    # 圆角3
    fillet_3_edges = [body_2_1.edges().sort_by_distance(p)[0] for p in [
        (22.5, -105.268665882, 17),
        (42.5, -105.268665882, 17),
    ]]
    fillet(fillet_3_edges, radius=FILLET_3_R - 0.0001)  # a hair under: the kernel refuses the full size

    # 圆角4
    fillet_4_edges = [body_2_1.edges().sort_by_distance(p)[0] for p in [
        (-42.5, -105.268665882, 17),
        (-22.5, -105.268665882, 17),
    ]]
    fillet(fillet_4_edges, radius=FILLET_4_R - 0.0001)  # a hair under: the kernel refuses the full size

    # 圆角5
    fillet_5_edges = [body_2_1.edges().sort_by_distance(p)[0] for p in [
        (16.5, -96.24704609, 15),
        (48.5, -96.24704609, 15),
        (48.5, -107.768665882, 15),
        (16.5, -107.768665882, 15),
    ]]
    fillet(fillet_5_edges, radius=FILLET_5_R)

    # 圆角6
    fillet_6_edges = [body_2_1.edges().sort_by_distance(p)[0] for p in [
        (-48.5, -96.24704609, 15),
        (-16.5, -96.24704609, 15),
        (-16.5, -107.768665882, 15),
        (-48.5, -107.768665882, 15),
    ]]
    fillet(fillet_6_edges, radius=FILLET_6_R)

    # 草图26 → 切除-拉伸18 (cut)
    with BuildSketch(Plane.XZ.offset(107.768665882)):
        with BuildLine():
            Line((35.9, 20.5), (35.9, 32.5))
            ThreePointArc((35.9, 32.5), (37.5, 34.1), (39.1, 32.5))
            Line((39.1, 32.5), (39.1, 20.5))
            ThreePointArc((39.1, 20.5), (37.5, 18.9), (35.9, 20.5))
        make_face()
        with BuildLine():
            Line((25.9, 20.5), (25.9, 32.5))
            ThreePointArc((25.9, 32.5), (27.5, 34.1), (29.1, 32.5))
            Line((29.1, 32.5), (29.1, 20.5))
            ThreePointArc((29.1, 20.5), (27.5, 18.9), (25.9, 20.5))
        make_face()
        with BuildLine():
            Line((-29.1, 20.5), (-29.1, 32.5))
            ThreePointArc((-29.1, 32.5), (-27.5, 34.1), (-25.9, 32.5))
            Line((-25.9, 32.5), (-25.9, 20.5))
            ThreePointArc((-25.9, 20.5), (-27.5, 18.9), (-29.1, 20.5))
        make_face()
        with BuildLine():
            Line((-39.1, 20.5), (-39.1, 32.5))
            ThreePointArc((-39.1, 32.5), (-37.5, 34.1), (-35.9, 32.5))
            Line((-35.9, 32.5), (-35.9, 20.5))
            ThreePointArc((-35.9, 20.5), (-37.5, 18.9), (-39.1, 20.5))
        make_face()
    extrude(amount=-CUT_EXTRUDE_18_DEPTH, mode=Mode.SUBTRACT)

    # 草图27 → 切除-拉伸19 (cut, two sides: drawn at the far end of the back side and taken through both)
    with BuildSketch(Plane(origin=(42.5, 0, 0), x_dir=(0, 0, -1), z_dir=(1, 0, 0)).offset(-CUT_EXTRUDE_19_DEPTH_BACK)):
        with Locations((-32.5, -103.268665882)):
            Rectangle(SKETCH_27_W, SKETCH_27_H)
    extrude(amount=CUT_EXTRUDE_19_DEPTH + CUT_EXTRUDE_19_DEPTH_BACK, mode=Mode.SUBTRACT)

    # 圆角8
    # the kernel refuses this fillet: 1 mm, written as the material it adds along each edge
    with BuildSketch(Plane(origin=(-12.2501, -103.768665882, 17), x_dir=(0, 0, 1), z_dir=(-1, 0, 0))) as fillet_8_piece_1_section:
        with BuildLine():
            CenterArc((FILLET_8_R, FILLET_8_R), FILLET_8_R, 180, 90)
            Line((0, FILLET_8_R), (0, 0))
            Line((0, 0), (FILLET_8_R, 0))
        make_face()
    fillet_8_piece_1 = extrude(amount=40.4998, mode=Mode.PRIVATE)
    fillet_8_piece_1 = split(fillet_8_piece_1, bisect_by=Plane(origin=(-16.5, -103.768665882, 17), z_dir=(-1, 0, 0)), keep=Keep.TOP, mode=Mode.PRIVATE)
    fillet_8_piece_1 = split(fillet_8_piece_1, bisect_by=Plane(origin=(-48.5, -103.768665882, 17), z_dir=(1, 0, 0)), keep=Keep.TOP, mode=Mode.PRIVATE)
    fillet_8_piece_1 = fillet_8_piece_1 - Plane(origin=(-48.4999, -103.768665882, 22.9999), x_dir=(1, 0, 0), z_dir=(0, -1, 0)) * Cylinder(5.9999, 85, mode=Mode.PRIVATE)
    fillet_8_piece_1 = fillet_8_piece_1 - Plane(origin=(-16.5001, -103.768665882, 22.9999), x_dir=(-1, 0, 0), z_dir=(0, -1, 0)) * Cylinder(5.9999, 85, mode=Mode.PRIVATE)
    add(fillet_8_piece_1)

    # 圆角9
    fillet_9_edges = [body_2_1.edges().sort_by_distance(p)[0] for p in [
        (32.5, -103.768665882, 17),
    ]]
    fillet(fillet_9_edges, radius=FILLET_9_R)

    # 圆角10
    fillet_10_edges = [body_2_1.edges().sort_by_distance(p)[0] for p in [
        (-42.5, -105.768665882, 48),
        (-22.5, -105.768665882, 48),
    ]]
    fillet(fillet_10_edges, radius=FILLET_10_R)

    # 草图28 → 切除-拉伸20 (cut)
    with BuildSketch(Plane.XZ.offset(107.768665882)):
        with Locations((0, 42.828466861)):
            Rectangle(SKETCH_28_W, SKETCH_28_H)
    extrude(amount=-CUT_EXTRUDE_20_DEPTH, mode=Mode.SUBTRACT)

    # 圆角12
    fillet_12_edges = [body_2_1.edges().sort_by_distance(p)[0] for p in [
        (22.5, -105.768665882, 37.656933722),
        (42.5, -105.768665882, 37.656933722),
    ]]
    fillet(fillet_12_edges, radius=FILLET_12_R)

    # 圆角13
    fillet_13_edges = [body_2_1.edges().sort_by_distance(p)[0] for p in [
        (-22.5, -105.768665882, 37.656933722),
        (-42.5, -105.768665882, 37.656933722),
    ]]
    fillet(fillet_13_edges, radius=FILLET_13_R)

    # 草图32 → 切除-拉伸22 (cut)
    with BuildSketch(Plane.XZ.offset(107.768665882)):
        with Locations((33.03738191, 27.290061412)):
            Rectangle(SKETCH_32_W, SKETCH_32_H)
    extrude(amount=-CUT_EXTRUDE_22_DEPTH, mode=Mode.SUBTRACT)


solid = body_2_1.part
